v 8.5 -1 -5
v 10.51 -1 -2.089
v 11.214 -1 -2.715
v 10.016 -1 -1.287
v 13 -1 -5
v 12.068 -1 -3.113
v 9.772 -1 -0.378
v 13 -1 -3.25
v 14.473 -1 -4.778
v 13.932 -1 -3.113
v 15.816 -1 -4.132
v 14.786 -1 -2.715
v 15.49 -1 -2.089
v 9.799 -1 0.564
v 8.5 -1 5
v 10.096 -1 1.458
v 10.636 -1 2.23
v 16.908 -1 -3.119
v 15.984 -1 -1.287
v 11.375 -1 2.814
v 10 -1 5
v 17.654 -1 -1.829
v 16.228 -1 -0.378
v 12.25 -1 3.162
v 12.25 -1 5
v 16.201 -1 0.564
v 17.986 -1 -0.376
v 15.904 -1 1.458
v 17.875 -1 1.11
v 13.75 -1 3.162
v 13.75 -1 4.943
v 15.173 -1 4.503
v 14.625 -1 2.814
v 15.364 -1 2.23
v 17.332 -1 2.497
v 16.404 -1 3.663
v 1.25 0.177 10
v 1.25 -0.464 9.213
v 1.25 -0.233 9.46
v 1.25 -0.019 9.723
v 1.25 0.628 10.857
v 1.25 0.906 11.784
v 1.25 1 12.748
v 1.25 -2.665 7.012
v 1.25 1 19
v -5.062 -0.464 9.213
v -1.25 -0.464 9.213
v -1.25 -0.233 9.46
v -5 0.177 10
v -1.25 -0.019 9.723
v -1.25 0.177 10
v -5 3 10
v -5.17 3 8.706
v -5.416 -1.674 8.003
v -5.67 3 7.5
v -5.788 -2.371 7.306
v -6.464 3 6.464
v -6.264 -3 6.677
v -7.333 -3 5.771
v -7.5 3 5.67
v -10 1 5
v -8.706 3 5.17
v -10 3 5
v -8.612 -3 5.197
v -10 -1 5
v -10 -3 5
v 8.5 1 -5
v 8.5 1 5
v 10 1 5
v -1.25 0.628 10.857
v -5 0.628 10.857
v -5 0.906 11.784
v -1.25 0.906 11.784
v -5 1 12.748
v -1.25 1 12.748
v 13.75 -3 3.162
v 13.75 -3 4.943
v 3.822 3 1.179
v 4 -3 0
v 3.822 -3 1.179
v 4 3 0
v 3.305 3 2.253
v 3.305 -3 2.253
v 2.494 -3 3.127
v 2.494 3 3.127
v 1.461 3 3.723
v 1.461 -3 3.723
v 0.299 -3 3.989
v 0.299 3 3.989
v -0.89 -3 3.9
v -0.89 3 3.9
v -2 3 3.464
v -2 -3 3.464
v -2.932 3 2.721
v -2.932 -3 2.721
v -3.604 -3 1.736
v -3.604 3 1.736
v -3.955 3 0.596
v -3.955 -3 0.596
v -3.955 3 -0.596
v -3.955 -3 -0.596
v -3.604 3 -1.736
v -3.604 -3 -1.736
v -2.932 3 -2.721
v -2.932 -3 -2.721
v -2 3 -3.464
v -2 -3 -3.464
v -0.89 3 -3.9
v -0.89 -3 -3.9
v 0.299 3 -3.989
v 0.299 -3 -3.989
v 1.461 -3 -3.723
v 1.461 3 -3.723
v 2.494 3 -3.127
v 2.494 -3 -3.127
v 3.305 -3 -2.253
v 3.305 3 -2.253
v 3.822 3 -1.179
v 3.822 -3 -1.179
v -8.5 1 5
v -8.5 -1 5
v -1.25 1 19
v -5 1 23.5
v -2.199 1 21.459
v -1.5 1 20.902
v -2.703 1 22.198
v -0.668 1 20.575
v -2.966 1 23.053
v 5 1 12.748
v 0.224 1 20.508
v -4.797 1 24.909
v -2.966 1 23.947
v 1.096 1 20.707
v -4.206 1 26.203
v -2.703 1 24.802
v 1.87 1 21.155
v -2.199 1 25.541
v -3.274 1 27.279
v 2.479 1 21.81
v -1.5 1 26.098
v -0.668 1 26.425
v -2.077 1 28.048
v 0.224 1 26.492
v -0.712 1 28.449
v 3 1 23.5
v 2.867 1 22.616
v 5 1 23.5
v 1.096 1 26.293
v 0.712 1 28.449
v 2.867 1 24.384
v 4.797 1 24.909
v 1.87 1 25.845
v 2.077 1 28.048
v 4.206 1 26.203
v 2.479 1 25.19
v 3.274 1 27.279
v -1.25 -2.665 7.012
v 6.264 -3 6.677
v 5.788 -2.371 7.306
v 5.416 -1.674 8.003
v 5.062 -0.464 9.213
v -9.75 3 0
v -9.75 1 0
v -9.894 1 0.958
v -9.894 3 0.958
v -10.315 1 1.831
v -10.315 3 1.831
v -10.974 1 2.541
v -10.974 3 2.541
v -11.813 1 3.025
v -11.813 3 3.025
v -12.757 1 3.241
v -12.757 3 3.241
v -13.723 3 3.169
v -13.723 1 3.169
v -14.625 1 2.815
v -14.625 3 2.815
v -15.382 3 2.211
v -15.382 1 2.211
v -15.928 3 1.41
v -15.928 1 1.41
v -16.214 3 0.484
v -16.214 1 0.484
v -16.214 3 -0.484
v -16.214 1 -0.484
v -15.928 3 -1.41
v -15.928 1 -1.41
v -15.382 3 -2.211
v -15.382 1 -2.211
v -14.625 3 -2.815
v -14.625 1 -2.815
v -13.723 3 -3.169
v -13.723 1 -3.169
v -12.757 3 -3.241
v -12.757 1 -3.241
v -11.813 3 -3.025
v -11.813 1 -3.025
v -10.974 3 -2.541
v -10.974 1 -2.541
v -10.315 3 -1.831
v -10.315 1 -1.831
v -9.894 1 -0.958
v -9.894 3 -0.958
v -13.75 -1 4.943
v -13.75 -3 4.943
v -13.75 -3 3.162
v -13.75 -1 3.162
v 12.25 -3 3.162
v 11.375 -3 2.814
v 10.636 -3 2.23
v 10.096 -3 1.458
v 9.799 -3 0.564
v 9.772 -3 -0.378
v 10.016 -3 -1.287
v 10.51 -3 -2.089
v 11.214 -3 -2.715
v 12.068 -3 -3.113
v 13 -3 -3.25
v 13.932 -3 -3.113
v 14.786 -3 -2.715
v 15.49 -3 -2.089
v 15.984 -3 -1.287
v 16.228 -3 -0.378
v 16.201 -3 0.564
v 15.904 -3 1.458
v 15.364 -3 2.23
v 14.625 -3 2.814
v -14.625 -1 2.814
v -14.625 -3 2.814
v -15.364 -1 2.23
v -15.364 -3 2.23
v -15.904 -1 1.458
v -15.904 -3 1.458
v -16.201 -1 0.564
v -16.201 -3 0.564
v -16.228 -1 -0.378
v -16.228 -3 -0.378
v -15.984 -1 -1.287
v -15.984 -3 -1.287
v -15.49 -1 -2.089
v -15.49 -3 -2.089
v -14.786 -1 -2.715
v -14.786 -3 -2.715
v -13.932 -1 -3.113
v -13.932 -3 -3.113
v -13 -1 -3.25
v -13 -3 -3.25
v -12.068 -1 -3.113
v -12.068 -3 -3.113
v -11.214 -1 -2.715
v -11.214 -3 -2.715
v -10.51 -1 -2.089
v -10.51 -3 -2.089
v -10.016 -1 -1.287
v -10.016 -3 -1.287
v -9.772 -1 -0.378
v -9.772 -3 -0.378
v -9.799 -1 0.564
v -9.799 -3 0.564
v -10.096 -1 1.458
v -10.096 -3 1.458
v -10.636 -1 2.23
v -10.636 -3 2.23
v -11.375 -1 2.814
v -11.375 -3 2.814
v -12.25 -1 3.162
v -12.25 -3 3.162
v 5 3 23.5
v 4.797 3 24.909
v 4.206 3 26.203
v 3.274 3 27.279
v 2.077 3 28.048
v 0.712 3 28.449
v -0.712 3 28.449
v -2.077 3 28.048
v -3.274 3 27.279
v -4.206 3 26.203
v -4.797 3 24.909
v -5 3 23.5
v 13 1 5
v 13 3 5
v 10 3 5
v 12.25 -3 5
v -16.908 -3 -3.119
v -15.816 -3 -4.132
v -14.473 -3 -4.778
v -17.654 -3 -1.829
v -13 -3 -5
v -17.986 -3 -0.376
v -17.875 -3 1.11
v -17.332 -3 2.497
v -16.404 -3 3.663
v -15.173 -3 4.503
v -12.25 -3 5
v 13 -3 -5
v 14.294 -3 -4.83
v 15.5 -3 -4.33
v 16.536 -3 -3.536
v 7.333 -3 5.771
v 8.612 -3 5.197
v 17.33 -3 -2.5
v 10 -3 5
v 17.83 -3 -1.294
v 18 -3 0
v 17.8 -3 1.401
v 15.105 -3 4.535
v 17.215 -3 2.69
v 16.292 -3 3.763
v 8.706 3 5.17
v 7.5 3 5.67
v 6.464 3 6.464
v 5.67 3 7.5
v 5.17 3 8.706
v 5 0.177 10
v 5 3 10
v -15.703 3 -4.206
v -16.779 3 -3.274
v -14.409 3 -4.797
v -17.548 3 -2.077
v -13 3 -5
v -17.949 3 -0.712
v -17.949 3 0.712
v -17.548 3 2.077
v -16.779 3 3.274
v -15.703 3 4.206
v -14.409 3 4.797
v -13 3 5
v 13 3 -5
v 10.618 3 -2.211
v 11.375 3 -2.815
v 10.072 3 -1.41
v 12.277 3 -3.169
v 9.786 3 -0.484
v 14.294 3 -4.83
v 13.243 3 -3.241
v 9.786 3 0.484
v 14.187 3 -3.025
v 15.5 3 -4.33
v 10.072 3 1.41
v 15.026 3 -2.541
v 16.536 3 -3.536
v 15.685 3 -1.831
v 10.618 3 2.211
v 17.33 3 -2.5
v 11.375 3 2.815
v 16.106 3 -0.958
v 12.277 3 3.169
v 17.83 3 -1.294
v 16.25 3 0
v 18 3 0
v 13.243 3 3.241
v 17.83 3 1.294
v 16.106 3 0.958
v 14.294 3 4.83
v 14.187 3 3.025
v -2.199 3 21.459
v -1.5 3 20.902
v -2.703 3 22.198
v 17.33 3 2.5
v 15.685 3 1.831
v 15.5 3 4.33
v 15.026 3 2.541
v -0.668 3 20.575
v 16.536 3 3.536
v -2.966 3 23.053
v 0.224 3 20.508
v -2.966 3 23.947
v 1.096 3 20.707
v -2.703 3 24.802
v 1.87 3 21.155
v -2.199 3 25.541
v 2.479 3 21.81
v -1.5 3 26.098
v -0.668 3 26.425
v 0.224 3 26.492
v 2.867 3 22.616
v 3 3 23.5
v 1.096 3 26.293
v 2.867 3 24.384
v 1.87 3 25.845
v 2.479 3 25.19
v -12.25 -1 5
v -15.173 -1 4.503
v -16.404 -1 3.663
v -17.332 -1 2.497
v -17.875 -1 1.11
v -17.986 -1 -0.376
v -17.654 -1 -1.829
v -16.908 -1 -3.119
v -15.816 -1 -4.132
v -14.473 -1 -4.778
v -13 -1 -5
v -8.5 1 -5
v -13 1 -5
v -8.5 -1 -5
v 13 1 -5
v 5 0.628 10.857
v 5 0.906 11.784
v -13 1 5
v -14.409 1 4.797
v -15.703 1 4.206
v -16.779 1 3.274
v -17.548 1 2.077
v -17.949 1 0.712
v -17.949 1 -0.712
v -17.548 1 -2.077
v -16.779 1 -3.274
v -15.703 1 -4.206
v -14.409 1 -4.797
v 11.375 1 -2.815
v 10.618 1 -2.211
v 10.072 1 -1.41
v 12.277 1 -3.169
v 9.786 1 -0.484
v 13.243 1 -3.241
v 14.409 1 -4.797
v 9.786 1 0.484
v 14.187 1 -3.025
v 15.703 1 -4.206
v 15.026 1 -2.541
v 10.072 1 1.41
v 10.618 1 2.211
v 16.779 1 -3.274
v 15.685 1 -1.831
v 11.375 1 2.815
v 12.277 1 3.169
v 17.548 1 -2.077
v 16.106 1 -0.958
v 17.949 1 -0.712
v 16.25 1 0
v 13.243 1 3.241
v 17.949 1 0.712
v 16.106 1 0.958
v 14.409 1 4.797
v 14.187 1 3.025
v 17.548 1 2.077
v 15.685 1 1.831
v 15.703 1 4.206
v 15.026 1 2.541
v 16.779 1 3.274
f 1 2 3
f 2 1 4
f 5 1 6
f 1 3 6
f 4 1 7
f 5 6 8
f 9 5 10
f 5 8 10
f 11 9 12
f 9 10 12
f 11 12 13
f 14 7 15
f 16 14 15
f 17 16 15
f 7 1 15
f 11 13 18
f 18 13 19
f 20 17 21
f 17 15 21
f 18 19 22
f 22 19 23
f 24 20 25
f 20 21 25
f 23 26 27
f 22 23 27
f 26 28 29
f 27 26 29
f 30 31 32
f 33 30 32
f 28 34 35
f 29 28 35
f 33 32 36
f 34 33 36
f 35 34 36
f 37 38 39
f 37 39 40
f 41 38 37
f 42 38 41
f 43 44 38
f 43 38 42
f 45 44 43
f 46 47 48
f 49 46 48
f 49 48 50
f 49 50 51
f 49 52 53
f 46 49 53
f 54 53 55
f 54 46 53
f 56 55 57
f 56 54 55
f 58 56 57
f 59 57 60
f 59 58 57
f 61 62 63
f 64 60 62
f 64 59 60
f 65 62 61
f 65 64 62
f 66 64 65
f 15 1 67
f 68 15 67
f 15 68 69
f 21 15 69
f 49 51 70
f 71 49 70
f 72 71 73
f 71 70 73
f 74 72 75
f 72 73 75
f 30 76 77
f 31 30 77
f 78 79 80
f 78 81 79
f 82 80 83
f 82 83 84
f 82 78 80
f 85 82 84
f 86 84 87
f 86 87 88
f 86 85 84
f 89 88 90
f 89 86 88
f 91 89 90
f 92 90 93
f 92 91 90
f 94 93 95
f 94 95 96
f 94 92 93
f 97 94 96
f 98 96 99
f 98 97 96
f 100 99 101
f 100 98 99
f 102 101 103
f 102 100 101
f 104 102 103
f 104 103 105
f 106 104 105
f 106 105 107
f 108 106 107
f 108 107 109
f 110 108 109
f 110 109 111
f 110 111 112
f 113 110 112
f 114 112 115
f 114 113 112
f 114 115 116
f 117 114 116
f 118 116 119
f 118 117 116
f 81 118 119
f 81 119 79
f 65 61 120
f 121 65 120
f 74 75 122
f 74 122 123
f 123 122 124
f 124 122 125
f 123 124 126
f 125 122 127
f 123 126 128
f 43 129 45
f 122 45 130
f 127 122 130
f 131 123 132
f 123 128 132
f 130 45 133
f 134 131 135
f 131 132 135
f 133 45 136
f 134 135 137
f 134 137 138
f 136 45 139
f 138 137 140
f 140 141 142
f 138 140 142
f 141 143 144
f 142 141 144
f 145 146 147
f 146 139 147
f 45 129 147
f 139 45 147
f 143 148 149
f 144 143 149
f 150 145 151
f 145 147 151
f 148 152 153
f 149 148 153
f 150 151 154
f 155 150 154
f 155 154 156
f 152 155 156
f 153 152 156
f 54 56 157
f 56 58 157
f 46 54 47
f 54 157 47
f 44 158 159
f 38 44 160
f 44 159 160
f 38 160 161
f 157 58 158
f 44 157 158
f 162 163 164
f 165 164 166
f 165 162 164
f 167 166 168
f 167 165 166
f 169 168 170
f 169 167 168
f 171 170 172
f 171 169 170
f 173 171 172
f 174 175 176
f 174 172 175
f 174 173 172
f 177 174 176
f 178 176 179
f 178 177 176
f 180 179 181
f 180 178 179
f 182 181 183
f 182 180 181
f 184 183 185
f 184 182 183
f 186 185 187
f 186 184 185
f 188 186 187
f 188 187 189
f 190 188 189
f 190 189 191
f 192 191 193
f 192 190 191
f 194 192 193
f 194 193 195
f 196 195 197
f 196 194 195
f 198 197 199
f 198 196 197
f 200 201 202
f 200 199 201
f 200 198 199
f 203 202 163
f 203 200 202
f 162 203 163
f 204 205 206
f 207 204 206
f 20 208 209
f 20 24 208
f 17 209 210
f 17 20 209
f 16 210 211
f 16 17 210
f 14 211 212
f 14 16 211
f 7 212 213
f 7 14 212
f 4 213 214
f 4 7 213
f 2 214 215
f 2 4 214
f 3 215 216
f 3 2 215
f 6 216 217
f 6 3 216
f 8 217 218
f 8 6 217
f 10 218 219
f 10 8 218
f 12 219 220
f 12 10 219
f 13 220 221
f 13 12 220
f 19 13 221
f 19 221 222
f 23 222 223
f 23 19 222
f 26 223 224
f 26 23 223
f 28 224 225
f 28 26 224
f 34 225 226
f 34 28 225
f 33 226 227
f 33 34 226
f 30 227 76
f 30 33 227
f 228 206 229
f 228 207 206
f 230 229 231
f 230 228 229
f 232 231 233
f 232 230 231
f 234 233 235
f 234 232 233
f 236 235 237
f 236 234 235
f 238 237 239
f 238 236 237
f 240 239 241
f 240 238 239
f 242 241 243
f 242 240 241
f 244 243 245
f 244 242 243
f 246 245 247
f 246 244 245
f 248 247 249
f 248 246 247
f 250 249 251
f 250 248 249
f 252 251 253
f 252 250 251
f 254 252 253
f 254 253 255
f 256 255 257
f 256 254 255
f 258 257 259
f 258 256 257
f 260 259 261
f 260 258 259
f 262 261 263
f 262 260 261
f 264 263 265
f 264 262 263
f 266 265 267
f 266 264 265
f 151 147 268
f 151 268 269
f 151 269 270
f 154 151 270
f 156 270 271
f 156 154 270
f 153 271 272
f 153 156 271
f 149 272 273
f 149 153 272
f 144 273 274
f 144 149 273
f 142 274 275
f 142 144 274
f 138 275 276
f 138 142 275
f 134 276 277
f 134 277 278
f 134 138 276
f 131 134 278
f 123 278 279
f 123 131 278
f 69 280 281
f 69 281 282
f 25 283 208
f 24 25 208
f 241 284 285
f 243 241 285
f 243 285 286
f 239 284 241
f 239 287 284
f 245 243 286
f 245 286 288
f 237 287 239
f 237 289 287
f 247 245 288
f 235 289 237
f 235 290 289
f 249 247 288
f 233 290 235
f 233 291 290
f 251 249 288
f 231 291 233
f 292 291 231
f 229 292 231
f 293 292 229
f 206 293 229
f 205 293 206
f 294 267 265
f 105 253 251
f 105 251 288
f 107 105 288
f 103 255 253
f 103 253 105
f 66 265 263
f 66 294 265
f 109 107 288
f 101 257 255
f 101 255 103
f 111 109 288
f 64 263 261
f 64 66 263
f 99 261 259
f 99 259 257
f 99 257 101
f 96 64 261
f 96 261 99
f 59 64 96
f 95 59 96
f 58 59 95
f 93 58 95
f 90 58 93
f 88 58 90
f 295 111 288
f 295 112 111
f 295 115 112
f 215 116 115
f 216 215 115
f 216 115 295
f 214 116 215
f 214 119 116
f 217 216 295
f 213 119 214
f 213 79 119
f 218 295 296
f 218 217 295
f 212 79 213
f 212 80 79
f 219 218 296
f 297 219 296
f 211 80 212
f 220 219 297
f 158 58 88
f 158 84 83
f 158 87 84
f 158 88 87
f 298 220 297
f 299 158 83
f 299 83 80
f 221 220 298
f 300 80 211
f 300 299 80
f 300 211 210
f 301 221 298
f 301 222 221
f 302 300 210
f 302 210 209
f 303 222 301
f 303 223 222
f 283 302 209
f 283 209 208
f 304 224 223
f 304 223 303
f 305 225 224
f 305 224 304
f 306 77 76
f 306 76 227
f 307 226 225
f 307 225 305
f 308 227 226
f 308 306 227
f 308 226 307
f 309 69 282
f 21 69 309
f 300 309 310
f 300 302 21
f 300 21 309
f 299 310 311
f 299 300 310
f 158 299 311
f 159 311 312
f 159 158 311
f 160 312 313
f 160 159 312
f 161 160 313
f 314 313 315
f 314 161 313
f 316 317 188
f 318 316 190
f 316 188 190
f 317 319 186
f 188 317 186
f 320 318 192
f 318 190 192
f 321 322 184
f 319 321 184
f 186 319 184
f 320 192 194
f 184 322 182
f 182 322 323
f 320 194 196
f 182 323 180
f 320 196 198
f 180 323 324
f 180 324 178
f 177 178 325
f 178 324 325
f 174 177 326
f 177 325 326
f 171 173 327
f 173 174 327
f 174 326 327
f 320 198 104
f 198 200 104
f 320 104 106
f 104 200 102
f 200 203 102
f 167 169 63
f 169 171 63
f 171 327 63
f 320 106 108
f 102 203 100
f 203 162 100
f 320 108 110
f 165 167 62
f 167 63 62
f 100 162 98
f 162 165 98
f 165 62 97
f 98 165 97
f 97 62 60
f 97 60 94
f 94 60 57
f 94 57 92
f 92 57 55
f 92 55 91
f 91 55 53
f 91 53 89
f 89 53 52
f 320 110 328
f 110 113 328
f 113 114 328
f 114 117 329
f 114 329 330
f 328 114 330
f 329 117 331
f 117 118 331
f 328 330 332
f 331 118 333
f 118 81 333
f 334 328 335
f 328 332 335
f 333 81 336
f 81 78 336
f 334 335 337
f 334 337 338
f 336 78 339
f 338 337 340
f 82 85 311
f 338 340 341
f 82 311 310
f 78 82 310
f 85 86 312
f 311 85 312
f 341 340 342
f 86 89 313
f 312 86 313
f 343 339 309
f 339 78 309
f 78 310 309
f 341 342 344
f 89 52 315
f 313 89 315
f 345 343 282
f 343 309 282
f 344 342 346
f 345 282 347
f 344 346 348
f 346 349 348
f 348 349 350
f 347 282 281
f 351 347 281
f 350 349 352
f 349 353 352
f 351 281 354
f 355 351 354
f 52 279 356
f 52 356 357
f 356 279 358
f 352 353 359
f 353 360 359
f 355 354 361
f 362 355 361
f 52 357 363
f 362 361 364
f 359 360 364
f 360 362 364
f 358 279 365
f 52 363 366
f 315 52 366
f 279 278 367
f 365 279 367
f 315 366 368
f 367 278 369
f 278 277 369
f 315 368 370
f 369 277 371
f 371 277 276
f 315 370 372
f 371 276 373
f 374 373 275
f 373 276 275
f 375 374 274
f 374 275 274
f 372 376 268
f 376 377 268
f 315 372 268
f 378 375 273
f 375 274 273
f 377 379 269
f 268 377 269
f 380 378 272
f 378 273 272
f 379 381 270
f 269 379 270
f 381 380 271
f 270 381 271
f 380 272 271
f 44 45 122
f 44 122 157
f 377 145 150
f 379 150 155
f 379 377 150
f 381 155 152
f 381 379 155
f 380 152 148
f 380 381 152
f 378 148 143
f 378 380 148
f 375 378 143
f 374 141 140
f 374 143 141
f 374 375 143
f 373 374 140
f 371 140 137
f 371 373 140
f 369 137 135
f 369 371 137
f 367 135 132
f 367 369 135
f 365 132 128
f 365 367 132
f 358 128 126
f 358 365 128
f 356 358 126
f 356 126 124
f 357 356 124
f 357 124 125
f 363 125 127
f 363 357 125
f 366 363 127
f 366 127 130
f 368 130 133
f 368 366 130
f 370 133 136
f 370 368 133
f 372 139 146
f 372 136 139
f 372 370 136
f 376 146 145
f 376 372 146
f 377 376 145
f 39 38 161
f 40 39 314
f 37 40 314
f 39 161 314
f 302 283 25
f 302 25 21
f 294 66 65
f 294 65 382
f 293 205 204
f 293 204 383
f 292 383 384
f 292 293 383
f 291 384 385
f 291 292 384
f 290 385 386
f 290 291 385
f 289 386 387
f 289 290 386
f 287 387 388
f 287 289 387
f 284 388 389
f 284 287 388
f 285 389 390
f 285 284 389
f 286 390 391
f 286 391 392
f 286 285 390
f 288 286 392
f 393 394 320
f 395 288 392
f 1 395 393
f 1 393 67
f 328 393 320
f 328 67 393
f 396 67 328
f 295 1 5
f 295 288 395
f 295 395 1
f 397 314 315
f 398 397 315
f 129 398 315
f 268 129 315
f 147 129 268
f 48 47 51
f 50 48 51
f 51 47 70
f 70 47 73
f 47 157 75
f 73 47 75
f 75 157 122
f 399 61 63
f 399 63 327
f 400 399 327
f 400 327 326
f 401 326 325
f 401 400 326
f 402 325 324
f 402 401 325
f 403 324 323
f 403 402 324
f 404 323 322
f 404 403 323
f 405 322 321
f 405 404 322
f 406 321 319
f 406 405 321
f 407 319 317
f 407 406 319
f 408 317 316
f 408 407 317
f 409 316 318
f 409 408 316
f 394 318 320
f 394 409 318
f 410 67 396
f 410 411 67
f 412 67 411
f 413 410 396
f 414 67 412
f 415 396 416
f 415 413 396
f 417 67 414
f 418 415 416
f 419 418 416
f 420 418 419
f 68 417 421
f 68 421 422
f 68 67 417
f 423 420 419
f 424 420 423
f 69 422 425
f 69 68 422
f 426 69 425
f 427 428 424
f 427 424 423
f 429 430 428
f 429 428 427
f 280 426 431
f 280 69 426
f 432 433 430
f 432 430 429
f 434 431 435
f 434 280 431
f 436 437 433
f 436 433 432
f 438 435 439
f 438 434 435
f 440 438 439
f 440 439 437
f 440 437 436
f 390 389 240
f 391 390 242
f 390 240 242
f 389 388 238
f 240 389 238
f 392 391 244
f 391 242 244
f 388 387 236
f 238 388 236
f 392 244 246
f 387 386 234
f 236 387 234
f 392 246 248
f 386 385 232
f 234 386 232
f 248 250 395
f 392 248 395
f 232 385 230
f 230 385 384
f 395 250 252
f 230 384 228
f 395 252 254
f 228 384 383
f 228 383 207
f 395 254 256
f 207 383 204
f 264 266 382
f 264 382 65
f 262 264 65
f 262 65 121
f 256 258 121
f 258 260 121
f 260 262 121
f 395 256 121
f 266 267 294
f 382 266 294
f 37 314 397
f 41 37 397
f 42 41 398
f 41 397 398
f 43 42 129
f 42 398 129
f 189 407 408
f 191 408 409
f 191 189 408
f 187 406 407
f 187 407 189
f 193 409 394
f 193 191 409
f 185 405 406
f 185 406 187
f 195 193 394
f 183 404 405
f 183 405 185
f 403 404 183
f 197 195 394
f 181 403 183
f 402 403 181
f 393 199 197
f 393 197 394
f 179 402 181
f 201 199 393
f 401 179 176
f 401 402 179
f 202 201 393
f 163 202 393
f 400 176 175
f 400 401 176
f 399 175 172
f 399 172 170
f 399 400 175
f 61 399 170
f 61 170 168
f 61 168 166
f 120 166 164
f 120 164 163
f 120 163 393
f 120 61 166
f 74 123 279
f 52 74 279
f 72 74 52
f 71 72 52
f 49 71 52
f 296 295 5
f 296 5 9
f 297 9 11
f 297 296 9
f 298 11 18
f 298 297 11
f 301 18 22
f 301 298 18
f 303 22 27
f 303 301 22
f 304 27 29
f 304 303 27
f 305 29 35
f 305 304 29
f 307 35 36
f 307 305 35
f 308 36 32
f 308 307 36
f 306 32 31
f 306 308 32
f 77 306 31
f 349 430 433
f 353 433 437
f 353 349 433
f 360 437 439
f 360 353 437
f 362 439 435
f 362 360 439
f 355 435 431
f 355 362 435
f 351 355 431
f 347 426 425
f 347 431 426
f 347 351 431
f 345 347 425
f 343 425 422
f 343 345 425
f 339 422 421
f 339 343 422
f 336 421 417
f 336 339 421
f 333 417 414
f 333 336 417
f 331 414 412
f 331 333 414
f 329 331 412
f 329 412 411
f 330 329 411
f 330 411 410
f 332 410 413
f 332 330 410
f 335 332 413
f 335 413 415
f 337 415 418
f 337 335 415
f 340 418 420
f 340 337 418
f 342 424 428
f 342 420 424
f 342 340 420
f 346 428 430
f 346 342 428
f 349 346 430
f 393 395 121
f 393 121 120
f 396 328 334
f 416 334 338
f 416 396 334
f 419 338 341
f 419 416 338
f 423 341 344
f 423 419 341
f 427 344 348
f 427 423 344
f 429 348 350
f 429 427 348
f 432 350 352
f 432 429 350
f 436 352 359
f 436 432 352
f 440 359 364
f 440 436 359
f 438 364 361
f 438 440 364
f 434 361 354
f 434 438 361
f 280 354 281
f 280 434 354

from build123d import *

# Parameters (mm, degrees)
F0_R      = 3.25
F0_R_2    = 4
F0_R_3    = 3
F1_DEPTH  = 3
F2_W      = 9.5
F2_H      = 2
F3_DEPTH  = 10.001
F5_DEPTH  = 2
F6_W      = 4
F6_H      = 5
F7_DEPTH  = 25
F8_DEPTH  = 25
F11_DEPTH = 1.25


with BuildPart() as f1:
    # F0 (on Front) → F1 (new body, symmetric)
    with BuildSketch(Plane.XZ):
        with BuildLine():
            Line((-10, 5), (-13, 5))
            ThreePointArc((-13, 5), (-18, 0), (-13, -5))
            Line((-13, -5), (13, -5))
            ThreePointArc((13, -5), (8, 0), (13, 5))
            Line((13, 5), (10, 5))
            ThreePointArc((10, 5), (6.4644660941, 6.4644660941), (5, 10))
            Line((5, 10), (5, 23.5))
            ThreePointArc((5, 23.5), (0, 28.5), (-5, 23.5))
            Line((-5, 23.5), (-5, 10))
            ThreePointArc((-5, 10), (-6.4644660941, 6.4644660941), (-10, 5))
        make_face()
        with Locations((-13, 0)):
            Circle(F0_R, mode=Mode.SUBTRACT)
        Circle(F0_R_2, mode=Mode.SUBTRACT)
        with Locations((0, 23.5)):
            Circle(F0_R_3, mode=Mode.SUBTRACT)
        with BuildLine():
            ThreePointArc((13, 5), (8, 0), (13, -5))
            ThreePointArc((13, -5), (16.5355339059, -3.5355339059), (18, 0))
            ThreePointArc((18, 0), (16.5355339059, 3.5355339059), (13, 5))
        make_face()
        with Locations((13, 0)):
            Circle(F0_R, mode=Mode.SUBTRACT)
    extrude(amount=F1_DEPTH, both=True)

    # F2 (on face) → F3 (cut, through all)
    with BuildSketch(Plane.XY.offset(5)):
        with Locations((13.25, 0)):
            Rectangle(F2_W, F2_H)
        with Locations((-13.25, 0)):
            Rectangle(F2_W, F2_H)
    extrude(amount=-F3_DEPTH, mode=Mode.SUBTRACT)

    # F4 (on face) → F5 (cut)
    with BuildSketch(Plane.XZ.offset(3)):
        with BuildLine():
            Line((-13.75, 4.9434299833), (-13.75, 3.1622776602))
            ThreePointArc((-13.75, 3.1622776602), (-13, 3.25), (-12.25, 3.1622776602))
            Line((-12.25, 3.1622776602), (-12.25, 5))
            Line((-12.25, 5), (-13, 5))
            ThreePointArc((-13, 5), (-13.3760652094, 4.985837438), (-13.75, 4.9434299833))
        make_face()
        with BuildLine():
            Line((12.25, 5), (12.25, 3.1622776602))
            ThreePointArc((12.25, 3.1622776602), (13, 3.25), (13.75, 3.1622776602))
            Line((13.75, 3.1622776602), (13.75, 4.9434299833))
            ThreePointArc((13.75, 4.9434299833), (13.3760652094, 4.985837438), (13, 5))
            Line((13, 5), (12.25, 5))
        make_face()
    extrude(amount=-F5_DEPTH, mode=Mode.SUBTRACT)

    # F6 (on face) → F7 (cut)
    with BuildSketch(Plane.YZ.offset(5)):
        with BuildLine():
            Line((0.1769726777, 10), (-3, 10))
            Line((-3, 10), (-3, 6.6771860428))
            Line((-3, 6.6771860428), (-0.4644660941, 9.2127199488))
            ThreePointArc((-0.4644660941, 9.2127199488), (-0.1237077096, 9.5900331405), (0.1769726777, 10))
        make_face()
        with BuildLine():
            Line((1, 23.5), (-3, 23.5))
            Line((-3, 23.5), (-3, 10))
            Line((-3, 10), (0.1769726777, 10))
            ThreePointArc((0.1769726777, 10), (0.7898258522, 11.3138312162), (1, 12.7482538547))
            Line((1, 12.7482538547), (1, 23.5))
        make_face()
        with Locations((-1, 26)):
            Rectangle(F6_W, F6_H)
    extrude(amount=-F7_DEPTH, mode=Mode.SUBTRACT)

    # F8 (cut): a face of the model
    f8_faces = [f1.faces().sort_by_distance(p)[0] for p in [
        (5, -1.9067294232, 8.8858021834),
    ]]
    extrude(f8_faces, amount=-F8_DEPTH, mode=Mode.SUBTRACT)

    # F10 (on offset) → F11 (join, symmetric)
    with BuildSketch(Plane.YZ):
        with BuildLine():
            ThreePointArc((0.1769726777, 10), (0.7898258522, 11.3138312162), (1, 12.7482538547))
            Line((1, 12.7482538547), (1, 19))
            Line((1, 19), (-2.6650612591, 7.0121247837))
            Line((-2.6650612591, 7.0121247837), (-0.4644660941, 9.2127199488))
            ThreePointArc((-0.4644660941, 9.2127199488), (-0.1237077096, 9.5900331405), (0.1769726777, 10))
        make_face()
    extrude(amount=F11_DEPTH, both=True)


solid = f1.part
